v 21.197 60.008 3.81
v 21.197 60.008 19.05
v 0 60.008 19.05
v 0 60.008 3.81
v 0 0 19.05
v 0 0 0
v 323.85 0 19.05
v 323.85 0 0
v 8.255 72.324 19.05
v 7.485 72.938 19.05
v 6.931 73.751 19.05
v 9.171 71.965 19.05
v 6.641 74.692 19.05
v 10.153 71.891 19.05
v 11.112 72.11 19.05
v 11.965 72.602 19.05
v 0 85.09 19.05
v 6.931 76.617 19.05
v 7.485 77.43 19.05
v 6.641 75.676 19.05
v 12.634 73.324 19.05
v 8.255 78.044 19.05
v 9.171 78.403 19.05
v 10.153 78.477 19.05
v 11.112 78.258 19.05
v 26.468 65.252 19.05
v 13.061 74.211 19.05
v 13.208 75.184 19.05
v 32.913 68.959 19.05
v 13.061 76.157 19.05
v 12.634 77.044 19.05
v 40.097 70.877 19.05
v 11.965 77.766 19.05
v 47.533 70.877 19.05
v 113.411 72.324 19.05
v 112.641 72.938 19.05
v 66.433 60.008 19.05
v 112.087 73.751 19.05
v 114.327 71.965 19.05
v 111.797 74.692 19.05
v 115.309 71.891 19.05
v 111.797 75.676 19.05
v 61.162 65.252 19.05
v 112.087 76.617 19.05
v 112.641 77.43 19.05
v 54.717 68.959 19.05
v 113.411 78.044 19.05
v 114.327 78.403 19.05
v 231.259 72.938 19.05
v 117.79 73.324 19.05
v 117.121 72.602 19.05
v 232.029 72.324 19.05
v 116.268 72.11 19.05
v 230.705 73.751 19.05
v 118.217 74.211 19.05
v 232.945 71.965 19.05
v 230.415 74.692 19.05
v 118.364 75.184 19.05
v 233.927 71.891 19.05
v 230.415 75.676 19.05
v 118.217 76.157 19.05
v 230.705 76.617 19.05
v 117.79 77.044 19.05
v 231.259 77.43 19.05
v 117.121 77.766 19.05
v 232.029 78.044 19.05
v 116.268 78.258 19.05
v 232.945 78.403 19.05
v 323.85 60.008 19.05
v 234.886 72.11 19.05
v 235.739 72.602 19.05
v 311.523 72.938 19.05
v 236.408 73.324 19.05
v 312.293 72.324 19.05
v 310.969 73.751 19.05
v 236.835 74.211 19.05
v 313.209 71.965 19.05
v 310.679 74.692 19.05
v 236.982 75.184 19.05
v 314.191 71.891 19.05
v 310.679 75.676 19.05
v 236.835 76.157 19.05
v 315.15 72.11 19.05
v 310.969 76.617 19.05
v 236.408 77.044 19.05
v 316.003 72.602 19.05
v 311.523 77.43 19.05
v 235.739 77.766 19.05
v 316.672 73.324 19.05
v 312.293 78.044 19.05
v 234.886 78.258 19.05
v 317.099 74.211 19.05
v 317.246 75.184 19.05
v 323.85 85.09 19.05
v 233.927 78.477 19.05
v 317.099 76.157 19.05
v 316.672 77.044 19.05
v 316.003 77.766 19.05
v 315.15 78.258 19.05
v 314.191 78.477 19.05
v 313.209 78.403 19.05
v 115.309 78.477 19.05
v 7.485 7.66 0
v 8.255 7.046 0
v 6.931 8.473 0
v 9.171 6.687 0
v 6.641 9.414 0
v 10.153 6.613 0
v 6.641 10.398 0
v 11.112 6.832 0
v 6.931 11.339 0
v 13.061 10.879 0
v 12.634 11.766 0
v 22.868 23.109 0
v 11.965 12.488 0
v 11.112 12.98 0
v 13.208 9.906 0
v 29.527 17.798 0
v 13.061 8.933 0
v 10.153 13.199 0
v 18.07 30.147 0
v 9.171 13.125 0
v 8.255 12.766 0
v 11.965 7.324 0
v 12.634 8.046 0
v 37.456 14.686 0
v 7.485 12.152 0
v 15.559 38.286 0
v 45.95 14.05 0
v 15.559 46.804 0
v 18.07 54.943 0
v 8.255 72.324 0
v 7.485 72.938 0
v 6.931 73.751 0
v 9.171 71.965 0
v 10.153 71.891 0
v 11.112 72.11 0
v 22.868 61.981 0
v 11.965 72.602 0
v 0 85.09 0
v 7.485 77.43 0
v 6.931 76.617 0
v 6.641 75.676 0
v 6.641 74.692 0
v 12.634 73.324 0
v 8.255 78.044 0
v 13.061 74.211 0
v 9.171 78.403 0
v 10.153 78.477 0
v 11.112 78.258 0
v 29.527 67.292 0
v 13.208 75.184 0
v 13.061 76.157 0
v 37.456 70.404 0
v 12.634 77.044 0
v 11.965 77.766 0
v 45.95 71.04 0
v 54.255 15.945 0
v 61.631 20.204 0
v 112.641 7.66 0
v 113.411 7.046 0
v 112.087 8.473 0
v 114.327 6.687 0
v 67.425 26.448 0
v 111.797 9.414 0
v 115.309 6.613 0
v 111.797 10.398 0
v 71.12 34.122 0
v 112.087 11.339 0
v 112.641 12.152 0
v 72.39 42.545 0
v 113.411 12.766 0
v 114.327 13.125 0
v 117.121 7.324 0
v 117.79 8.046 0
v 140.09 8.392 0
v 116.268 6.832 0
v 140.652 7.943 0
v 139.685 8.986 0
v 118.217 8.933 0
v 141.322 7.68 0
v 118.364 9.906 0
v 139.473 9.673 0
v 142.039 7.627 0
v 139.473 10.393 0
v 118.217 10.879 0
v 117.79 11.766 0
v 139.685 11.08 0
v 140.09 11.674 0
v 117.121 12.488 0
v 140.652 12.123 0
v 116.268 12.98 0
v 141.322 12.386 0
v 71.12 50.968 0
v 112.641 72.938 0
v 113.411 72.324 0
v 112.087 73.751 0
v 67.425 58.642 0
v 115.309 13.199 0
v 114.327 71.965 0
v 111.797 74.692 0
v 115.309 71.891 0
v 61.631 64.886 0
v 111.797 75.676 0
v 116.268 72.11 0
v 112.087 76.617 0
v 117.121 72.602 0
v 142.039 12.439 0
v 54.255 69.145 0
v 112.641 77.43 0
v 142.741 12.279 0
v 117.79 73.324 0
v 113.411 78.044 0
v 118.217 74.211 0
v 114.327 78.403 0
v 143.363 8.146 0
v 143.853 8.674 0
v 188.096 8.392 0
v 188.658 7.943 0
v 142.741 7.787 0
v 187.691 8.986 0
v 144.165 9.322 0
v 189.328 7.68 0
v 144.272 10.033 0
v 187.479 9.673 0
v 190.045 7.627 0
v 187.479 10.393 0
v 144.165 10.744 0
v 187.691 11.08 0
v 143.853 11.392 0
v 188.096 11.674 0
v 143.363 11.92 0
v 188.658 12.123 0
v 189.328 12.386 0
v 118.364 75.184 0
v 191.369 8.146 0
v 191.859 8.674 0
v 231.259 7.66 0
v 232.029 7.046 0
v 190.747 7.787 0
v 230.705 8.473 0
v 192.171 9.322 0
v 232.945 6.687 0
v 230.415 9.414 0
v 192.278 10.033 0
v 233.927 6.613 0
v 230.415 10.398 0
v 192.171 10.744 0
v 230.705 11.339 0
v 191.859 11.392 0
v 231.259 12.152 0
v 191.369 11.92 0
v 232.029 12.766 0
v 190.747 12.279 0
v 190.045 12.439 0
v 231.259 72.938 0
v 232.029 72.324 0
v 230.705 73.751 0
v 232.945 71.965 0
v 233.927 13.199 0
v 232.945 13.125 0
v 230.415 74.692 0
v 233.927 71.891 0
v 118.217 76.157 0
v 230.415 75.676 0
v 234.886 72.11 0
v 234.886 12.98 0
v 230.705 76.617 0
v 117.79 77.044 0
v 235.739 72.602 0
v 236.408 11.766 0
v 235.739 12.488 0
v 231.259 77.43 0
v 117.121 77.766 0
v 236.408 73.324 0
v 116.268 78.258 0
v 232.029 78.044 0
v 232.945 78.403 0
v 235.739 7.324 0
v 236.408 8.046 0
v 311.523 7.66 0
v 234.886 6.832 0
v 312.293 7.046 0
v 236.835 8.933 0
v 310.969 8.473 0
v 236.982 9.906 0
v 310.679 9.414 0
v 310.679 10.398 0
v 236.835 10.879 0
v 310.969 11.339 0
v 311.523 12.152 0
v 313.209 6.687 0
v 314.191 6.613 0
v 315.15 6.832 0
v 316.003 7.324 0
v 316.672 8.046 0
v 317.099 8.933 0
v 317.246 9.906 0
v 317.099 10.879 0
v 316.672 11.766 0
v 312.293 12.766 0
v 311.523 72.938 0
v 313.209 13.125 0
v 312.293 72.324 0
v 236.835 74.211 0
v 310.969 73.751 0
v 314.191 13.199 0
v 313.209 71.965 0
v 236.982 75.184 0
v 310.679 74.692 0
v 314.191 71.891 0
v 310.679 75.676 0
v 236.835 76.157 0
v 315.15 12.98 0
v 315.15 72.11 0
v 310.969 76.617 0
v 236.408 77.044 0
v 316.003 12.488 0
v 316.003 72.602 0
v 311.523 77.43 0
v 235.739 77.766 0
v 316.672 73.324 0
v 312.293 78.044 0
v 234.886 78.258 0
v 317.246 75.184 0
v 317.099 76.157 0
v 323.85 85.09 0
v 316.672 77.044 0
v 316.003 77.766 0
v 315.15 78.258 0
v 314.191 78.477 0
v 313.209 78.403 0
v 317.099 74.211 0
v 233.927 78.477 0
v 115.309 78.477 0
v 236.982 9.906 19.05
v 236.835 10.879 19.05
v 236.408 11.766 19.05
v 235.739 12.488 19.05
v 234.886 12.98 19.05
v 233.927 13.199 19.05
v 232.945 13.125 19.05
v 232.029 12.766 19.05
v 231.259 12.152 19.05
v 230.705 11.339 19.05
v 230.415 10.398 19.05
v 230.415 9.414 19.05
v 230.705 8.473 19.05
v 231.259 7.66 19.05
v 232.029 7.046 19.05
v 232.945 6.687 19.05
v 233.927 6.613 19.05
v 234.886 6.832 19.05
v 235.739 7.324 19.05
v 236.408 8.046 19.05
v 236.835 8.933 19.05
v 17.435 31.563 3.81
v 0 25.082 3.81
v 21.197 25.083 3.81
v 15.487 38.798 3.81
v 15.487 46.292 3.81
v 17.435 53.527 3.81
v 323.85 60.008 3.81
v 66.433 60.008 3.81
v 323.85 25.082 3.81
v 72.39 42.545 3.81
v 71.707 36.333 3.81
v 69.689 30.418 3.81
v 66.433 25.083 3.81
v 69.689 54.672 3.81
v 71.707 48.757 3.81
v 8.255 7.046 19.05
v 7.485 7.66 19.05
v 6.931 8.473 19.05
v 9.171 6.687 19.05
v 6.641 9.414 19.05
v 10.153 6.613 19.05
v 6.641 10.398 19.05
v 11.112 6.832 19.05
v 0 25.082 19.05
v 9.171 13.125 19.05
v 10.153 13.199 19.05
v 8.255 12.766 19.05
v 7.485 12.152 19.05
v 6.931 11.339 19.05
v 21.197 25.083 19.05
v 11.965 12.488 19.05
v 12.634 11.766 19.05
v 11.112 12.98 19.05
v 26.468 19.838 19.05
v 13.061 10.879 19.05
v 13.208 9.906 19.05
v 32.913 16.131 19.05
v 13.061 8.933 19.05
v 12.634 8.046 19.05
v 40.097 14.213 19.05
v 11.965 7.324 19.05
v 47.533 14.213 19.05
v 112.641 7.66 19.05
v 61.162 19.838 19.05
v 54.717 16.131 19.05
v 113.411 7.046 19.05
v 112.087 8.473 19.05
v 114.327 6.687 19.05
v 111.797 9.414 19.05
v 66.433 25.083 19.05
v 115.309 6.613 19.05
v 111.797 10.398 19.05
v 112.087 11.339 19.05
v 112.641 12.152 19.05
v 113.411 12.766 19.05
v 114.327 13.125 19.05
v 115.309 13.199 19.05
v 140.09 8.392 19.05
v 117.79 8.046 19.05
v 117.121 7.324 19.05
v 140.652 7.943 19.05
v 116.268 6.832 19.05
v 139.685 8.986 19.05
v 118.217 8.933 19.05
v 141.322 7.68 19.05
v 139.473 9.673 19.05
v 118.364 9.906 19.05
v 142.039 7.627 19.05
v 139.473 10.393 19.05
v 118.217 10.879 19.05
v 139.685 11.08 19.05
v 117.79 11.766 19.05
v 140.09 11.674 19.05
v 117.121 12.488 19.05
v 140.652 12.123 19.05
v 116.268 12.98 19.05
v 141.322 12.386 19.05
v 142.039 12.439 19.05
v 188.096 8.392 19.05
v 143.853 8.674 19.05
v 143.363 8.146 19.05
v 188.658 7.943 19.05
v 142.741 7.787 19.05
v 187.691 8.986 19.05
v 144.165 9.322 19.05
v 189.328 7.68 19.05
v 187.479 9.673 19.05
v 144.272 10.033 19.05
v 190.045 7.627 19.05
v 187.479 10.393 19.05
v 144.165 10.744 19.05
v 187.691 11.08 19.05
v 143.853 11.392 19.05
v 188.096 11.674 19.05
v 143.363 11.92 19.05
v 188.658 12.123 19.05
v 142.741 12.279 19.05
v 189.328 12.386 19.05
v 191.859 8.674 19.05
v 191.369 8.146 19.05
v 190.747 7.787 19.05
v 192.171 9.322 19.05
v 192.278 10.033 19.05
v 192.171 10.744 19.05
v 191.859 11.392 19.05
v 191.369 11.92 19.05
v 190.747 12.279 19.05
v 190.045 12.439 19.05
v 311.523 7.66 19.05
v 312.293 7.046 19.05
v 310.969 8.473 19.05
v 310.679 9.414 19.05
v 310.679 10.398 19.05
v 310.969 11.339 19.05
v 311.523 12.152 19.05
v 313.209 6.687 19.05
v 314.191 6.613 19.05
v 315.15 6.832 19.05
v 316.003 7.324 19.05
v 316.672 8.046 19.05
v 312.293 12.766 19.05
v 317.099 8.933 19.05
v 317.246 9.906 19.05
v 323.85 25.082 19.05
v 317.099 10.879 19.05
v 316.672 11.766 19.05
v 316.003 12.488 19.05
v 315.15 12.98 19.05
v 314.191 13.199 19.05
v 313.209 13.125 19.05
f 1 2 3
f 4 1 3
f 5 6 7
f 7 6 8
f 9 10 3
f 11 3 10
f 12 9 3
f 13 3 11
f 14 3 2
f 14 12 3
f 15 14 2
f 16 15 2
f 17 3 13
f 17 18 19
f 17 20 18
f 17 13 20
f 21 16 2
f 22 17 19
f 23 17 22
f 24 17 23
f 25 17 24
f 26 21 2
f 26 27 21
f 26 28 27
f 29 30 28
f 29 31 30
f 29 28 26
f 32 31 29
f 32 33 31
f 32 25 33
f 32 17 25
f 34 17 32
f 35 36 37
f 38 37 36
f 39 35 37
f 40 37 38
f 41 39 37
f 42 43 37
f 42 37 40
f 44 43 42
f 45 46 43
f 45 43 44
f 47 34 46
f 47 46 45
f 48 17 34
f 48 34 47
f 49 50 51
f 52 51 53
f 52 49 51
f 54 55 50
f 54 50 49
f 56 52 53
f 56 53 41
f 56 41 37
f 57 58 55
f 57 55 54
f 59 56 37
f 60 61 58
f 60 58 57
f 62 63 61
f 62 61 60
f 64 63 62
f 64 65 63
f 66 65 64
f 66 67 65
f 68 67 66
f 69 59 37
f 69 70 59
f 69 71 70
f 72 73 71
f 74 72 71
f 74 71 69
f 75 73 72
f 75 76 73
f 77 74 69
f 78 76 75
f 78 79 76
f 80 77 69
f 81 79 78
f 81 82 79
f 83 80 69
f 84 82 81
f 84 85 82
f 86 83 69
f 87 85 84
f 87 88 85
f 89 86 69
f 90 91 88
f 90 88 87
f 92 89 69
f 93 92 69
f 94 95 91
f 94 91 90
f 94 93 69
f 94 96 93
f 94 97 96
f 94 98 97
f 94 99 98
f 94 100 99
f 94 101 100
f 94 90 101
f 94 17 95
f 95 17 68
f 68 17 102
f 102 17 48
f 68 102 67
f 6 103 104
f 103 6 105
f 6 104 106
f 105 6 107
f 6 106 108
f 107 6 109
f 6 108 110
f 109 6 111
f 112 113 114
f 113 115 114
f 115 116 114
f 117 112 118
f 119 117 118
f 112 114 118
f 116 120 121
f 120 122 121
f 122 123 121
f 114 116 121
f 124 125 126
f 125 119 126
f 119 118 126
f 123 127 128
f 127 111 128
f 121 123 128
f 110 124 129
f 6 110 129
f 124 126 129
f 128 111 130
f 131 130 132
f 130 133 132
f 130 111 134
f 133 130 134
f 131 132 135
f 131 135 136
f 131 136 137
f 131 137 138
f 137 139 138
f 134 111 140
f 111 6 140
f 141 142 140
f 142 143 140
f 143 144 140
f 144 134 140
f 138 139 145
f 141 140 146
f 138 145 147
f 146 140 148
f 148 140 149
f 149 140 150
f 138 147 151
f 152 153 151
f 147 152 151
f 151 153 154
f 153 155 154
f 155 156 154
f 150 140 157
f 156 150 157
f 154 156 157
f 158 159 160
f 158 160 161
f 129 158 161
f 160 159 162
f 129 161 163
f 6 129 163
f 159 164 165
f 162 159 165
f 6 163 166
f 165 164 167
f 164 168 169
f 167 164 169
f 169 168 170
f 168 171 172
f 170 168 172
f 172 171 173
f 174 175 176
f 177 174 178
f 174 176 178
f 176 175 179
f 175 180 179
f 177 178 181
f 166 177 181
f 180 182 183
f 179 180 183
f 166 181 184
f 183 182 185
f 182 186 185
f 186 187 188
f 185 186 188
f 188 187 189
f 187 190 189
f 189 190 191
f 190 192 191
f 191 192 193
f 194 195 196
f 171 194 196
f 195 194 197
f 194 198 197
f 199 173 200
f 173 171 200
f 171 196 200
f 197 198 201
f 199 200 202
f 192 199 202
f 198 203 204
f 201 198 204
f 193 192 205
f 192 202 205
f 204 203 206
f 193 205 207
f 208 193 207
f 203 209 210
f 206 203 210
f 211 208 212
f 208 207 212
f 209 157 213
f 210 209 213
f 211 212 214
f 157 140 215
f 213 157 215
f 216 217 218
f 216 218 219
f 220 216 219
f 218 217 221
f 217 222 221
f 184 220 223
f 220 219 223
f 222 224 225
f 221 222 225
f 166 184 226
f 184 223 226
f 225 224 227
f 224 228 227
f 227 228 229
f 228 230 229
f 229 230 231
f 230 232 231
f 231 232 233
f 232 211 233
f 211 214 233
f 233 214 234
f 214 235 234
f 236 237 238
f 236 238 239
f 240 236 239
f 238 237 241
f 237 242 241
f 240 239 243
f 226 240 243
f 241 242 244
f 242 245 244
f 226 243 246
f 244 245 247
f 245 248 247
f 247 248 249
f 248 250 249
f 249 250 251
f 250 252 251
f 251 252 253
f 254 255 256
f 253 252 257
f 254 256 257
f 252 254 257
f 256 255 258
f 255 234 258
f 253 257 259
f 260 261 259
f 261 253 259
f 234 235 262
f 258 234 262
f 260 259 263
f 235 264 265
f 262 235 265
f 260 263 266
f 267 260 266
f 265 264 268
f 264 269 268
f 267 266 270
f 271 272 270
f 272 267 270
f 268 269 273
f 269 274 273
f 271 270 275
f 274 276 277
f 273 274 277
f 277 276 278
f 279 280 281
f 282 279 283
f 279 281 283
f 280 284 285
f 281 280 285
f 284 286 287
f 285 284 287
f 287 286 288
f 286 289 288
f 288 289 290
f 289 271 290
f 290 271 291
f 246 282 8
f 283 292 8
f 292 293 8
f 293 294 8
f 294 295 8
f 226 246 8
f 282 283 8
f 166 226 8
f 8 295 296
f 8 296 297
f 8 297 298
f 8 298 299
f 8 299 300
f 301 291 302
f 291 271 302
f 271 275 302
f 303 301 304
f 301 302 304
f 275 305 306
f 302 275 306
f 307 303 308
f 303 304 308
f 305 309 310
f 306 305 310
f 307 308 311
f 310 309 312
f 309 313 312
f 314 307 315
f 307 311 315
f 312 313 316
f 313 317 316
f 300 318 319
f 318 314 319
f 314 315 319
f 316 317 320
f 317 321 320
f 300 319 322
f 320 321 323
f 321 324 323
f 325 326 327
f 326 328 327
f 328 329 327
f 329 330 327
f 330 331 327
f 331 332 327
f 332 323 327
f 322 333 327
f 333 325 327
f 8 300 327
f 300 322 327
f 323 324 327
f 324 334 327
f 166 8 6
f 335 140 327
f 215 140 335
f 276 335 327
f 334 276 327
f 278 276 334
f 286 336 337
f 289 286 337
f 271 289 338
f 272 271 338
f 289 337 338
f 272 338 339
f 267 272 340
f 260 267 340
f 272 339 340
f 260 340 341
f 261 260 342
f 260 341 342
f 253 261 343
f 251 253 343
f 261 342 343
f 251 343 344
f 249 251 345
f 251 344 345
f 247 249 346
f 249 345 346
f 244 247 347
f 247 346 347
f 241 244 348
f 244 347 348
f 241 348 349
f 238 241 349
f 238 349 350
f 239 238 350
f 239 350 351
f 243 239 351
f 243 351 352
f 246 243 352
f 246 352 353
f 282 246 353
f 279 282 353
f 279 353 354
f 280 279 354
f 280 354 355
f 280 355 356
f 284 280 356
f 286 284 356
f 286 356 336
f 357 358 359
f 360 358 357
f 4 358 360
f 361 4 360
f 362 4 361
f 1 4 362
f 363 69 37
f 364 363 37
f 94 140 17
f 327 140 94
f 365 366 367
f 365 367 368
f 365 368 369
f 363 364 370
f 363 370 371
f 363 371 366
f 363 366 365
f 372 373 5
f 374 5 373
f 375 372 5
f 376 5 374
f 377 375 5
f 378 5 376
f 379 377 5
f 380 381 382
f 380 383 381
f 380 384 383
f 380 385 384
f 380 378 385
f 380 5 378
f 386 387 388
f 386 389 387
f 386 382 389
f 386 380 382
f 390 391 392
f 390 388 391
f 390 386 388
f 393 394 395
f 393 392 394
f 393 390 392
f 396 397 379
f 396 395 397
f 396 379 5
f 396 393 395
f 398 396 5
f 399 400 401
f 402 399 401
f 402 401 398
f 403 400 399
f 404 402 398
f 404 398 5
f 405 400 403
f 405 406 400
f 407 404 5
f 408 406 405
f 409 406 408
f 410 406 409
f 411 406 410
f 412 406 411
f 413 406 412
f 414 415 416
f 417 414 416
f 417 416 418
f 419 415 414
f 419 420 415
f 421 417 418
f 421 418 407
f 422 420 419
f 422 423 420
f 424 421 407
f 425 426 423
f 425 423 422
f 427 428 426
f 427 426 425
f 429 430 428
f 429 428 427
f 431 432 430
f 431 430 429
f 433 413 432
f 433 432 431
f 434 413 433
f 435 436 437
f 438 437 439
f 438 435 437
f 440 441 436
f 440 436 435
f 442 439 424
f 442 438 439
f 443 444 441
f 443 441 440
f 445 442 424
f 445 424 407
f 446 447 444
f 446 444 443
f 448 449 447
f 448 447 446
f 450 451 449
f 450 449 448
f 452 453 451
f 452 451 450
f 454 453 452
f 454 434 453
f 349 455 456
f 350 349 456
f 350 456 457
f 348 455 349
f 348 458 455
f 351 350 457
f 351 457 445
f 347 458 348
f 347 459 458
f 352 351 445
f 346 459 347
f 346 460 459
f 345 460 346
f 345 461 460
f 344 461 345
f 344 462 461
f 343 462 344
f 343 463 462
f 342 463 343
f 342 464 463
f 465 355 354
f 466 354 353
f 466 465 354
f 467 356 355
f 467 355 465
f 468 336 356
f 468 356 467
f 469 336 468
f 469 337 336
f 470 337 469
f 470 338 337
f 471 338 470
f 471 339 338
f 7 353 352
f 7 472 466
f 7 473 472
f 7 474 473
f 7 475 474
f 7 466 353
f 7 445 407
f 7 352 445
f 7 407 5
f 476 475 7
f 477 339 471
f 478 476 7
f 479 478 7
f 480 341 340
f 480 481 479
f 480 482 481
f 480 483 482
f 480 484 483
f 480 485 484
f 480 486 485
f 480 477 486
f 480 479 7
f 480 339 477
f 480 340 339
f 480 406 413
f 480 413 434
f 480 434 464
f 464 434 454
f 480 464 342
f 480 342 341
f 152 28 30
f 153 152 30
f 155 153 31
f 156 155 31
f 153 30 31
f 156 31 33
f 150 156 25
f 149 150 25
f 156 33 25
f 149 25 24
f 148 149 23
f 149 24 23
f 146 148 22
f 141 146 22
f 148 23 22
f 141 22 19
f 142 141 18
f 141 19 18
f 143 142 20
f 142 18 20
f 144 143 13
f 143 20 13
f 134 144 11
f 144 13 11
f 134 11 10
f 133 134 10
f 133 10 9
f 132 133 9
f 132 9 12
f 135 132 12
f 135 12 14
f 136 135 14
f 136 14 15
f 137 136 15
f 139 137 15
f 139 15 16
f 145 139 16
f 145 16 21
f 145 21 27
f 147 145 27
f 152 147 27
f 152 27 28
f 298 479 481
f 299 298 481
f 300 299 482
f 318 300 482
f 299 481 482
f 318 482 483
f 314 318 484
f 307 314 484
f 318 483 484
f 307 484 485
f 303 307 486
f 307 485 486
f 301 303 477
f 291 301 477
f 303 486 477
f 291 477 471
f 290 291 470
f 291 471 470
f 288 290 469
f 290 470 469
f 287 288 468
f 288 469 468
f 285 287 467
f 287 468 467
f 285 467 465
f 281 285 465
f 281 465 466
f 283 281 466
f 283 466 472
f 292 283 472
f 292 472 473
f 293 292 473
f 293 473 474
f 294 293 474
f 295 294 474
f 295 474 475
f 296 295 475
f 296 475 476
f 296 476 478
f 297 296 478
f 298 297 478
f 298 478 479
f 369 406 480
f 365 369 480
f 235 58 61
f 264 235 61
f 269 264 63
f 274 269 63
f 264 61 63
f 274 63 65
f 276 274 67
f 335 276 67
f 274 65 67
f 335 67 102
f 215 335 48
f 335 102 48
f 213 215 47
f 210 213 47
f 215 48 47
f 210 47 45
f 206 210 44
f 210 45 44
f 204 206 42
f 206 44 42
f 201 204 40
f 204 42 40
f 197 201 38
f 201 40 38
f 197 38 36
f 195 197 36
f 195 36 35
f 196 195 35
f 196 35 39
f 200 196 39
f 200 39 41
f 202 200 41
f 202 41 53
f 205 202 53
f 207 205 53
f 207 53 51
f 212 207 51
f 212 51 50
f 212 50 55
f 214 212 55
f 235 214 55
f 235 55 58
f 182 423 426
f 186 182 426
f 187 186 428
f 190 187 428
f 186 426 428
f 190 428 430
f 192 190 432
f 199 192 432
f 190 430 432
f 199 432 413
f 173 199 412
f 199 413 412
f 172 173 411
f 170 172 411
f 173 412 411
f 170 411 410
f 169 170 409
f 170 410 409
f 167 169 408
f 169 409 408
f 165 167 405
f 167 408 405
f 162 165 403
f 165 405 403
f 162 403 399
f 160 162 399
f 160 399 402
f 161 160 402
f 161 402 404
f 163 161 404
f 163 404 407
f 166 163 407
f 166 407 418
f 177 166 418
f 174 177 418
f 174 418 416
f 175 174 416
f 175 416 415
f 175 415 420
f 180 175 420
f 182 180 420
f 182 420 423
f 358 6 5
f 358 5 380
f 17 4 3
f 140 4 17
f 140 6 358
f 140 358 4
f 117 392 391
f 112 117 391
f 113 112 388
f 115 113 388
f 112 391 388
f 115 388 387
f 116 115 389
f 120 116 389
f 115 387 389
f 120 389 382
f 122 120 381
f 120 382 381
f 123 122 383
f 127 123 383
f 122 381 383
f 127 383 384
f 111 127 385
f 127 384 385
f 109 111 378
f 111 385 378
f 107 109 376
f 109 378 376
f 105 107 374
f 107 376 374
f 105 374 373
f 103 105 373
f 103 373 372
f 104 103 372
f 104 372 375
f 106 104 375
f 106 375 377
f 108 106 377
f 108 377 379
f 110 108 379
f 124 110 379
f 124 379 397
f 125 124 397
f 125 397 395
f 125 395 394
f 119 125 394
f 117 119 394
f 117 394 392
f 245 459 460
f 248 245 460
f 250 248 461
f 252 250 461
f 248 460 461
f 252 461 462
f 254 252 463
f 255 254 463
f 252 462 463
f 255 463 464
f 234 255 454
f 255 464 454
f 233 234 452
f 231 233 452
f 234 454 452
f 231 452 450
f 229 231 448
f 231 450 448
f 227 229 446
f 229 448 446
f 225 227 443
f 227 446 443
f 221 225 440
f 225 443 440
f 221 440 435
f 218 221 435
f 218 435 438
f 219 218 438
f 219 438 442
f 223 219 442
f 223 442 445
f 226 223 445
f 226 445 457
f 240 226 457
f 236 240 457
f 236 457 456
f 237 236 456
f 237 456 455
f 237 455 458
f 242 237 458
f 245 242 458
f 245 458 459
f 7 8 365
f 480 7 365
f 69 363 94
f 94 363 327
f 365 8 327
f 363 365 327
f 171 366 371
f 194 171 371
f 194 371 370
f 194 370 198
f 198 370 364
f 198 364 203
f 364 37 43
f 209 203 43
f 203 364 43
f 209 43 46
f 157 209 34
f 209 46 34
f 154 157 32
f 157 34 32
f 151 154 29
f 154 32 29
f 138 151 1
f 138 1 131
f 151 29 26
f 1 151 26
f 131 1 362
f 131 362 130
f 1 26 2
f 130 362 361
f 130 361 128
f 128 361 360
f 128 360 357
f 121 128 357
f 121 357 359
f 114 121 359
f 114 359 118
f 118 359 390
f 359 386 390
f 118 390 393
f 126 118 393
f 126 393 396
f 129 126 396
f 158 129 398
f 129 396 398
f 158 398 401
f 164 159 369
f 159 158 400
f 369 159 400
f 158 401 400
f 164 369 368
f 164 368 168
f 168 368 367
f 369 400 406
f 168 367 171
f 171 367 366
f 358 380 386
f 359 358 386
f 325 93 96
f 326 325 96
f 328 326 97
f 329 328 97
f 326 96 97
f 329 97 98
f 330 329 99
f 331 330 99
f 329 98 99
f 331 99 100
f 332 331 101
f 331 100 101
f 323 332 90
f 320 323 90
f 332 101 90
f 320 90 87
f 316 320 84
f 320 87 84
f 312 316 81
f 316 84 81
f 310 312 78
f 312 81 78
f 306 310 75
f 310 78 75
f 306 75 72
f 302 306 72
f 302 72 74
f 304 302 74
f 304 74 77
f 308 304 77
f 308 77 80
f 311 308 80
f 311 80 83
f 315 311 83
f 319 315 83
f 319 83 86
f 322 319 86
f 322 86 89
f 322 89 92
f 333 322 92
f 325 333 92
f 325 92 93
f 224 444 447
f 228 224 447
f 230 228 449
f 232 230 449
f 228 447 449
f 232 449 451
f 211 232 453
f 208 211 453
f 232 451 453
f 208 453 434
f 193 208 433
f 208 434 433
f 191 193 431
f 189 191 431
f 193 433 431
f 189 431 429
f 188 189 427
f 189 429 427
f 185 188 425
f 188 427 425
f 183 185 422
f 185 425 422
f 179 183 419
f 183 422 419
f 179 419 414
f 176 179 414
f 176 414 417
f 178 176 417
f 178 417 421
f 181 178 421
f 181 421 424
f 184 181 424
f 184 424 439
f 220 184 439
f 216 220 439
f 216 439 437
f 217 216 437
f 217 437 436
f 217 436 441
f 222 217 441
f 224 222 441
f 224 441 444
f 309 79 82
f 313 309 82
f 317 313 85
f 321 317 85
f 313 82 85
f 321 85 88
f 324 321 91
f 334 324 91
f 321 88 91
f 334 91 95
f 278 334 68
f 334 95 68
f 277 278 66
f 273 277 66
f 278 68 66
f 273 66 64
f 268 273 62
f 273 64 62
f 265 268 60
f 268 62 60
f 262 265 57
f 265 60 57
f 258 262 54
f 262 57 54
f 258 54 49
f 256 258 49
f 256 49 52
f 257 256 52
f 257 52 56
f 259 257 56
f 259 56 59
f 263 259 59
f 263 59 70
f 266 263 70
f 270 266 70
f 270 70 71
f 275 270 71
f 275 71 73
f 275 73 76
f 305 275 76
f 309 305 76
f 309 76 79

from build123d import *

# Parameters (mm, degrees)
F0_W     = 323.85
F0_H     = 85.09
F1_DEPTH = 19.05
F2_R     = 28.575
F3_DEPTH = 19.051
F4_R     = 3.302
F5_DEPTH = 19.051
F6_R     = 2.413
F7_DEPTH = 19.051
F9_DEPTH = 15.24


with BuildPart() as f1:
    # F0 (on Top) → F1 (new body)
    with BuildSketch(Plane.XY):
        with Locations((161.925, 42.545)):
            Rectangle(F0_W, F0_H)
    extrude(amount=F1_DEPTH)

    # F2 (on face) → F3 (cut, through all)
    with BuildSketch(Plane.XY.offset(19.05)):
        with Locations((43.815, 42.545)):
            Circle(F2_R)
    extrude(amount=-F3_DEPTH, mode=Mode.SUBTRACT)

    # F4 (on face) → F5 (cut, through all)
    with BuildSketch(Plane.XY.offset(19.05)):
        with Locations((9.906, 75.184)):
            Circle(F4_R)
        with Locations((115.062, 75.184)):
            Circle(F4_R)
        with Locations((233.68, 75.184)):
            Circle(F4_R)
        with Locations((313.944, 75.184)):
            Circle(F4_R)
        with Locations((115.062, 9.906)):
            Circle(F4_R)
        with Locations((9.906, 9.906)):
            Circle(F4_R)
        with Locations((233.68, 9.906)):
            Circle(F4_R)
        with Locations((313.944, 9.906)):
            Circle(F4_R)
    extrude(amount=-F5_DEPTH, mode=Mode.SUBTRACT)

    # F6 (on face) → F7 (cut, through all)
    with BuildSketch(Plane.XY.offset(19.05)):
        with Locations((141.859, 10.033)):
            Circle(F6_R)
        with Locations((189.865, 10.033)):
            Circle(F6_R)
    extrude(amount=-F7_DEPTH, mode=Mode.SUBTRACT)

    # F8 (on face) → F9 (cut)
    with BuildSketch(Plane.XY.offset(19.05)):
        with BuildLine():
            Line((323.85, 60.0075), (66.433393, 60.0075))
            ThreePointArc((66.433393, 60.0075), (70.859881, 51.770238), (72.39, 42.545))
            ThreePointArc((72.39, 42.545), (70.859881, 33.319762), (66.433393, 25.0825))
            Line((66.433393, 25.0825), (323.85, 25.0825))
            Line((323.85, 25.0825), (323.85, 60.0075))
        make_face()
        with BuildLine():
            Line((21.196607, 60.0075), (0, 60.0075))
            Line((0, 60.0075), (0, 25.0825))
            Line((0, 25.0825), (21.196607, 25.0825))
            ThreePointArc((21.196607, 25.0825), (15.24, 42.545), (21.196607, 60.0075))
        make_face()
    extrude(amount=-F9_DEPTH, mode=Mode.SUBTRACT)


solid = f1.part
